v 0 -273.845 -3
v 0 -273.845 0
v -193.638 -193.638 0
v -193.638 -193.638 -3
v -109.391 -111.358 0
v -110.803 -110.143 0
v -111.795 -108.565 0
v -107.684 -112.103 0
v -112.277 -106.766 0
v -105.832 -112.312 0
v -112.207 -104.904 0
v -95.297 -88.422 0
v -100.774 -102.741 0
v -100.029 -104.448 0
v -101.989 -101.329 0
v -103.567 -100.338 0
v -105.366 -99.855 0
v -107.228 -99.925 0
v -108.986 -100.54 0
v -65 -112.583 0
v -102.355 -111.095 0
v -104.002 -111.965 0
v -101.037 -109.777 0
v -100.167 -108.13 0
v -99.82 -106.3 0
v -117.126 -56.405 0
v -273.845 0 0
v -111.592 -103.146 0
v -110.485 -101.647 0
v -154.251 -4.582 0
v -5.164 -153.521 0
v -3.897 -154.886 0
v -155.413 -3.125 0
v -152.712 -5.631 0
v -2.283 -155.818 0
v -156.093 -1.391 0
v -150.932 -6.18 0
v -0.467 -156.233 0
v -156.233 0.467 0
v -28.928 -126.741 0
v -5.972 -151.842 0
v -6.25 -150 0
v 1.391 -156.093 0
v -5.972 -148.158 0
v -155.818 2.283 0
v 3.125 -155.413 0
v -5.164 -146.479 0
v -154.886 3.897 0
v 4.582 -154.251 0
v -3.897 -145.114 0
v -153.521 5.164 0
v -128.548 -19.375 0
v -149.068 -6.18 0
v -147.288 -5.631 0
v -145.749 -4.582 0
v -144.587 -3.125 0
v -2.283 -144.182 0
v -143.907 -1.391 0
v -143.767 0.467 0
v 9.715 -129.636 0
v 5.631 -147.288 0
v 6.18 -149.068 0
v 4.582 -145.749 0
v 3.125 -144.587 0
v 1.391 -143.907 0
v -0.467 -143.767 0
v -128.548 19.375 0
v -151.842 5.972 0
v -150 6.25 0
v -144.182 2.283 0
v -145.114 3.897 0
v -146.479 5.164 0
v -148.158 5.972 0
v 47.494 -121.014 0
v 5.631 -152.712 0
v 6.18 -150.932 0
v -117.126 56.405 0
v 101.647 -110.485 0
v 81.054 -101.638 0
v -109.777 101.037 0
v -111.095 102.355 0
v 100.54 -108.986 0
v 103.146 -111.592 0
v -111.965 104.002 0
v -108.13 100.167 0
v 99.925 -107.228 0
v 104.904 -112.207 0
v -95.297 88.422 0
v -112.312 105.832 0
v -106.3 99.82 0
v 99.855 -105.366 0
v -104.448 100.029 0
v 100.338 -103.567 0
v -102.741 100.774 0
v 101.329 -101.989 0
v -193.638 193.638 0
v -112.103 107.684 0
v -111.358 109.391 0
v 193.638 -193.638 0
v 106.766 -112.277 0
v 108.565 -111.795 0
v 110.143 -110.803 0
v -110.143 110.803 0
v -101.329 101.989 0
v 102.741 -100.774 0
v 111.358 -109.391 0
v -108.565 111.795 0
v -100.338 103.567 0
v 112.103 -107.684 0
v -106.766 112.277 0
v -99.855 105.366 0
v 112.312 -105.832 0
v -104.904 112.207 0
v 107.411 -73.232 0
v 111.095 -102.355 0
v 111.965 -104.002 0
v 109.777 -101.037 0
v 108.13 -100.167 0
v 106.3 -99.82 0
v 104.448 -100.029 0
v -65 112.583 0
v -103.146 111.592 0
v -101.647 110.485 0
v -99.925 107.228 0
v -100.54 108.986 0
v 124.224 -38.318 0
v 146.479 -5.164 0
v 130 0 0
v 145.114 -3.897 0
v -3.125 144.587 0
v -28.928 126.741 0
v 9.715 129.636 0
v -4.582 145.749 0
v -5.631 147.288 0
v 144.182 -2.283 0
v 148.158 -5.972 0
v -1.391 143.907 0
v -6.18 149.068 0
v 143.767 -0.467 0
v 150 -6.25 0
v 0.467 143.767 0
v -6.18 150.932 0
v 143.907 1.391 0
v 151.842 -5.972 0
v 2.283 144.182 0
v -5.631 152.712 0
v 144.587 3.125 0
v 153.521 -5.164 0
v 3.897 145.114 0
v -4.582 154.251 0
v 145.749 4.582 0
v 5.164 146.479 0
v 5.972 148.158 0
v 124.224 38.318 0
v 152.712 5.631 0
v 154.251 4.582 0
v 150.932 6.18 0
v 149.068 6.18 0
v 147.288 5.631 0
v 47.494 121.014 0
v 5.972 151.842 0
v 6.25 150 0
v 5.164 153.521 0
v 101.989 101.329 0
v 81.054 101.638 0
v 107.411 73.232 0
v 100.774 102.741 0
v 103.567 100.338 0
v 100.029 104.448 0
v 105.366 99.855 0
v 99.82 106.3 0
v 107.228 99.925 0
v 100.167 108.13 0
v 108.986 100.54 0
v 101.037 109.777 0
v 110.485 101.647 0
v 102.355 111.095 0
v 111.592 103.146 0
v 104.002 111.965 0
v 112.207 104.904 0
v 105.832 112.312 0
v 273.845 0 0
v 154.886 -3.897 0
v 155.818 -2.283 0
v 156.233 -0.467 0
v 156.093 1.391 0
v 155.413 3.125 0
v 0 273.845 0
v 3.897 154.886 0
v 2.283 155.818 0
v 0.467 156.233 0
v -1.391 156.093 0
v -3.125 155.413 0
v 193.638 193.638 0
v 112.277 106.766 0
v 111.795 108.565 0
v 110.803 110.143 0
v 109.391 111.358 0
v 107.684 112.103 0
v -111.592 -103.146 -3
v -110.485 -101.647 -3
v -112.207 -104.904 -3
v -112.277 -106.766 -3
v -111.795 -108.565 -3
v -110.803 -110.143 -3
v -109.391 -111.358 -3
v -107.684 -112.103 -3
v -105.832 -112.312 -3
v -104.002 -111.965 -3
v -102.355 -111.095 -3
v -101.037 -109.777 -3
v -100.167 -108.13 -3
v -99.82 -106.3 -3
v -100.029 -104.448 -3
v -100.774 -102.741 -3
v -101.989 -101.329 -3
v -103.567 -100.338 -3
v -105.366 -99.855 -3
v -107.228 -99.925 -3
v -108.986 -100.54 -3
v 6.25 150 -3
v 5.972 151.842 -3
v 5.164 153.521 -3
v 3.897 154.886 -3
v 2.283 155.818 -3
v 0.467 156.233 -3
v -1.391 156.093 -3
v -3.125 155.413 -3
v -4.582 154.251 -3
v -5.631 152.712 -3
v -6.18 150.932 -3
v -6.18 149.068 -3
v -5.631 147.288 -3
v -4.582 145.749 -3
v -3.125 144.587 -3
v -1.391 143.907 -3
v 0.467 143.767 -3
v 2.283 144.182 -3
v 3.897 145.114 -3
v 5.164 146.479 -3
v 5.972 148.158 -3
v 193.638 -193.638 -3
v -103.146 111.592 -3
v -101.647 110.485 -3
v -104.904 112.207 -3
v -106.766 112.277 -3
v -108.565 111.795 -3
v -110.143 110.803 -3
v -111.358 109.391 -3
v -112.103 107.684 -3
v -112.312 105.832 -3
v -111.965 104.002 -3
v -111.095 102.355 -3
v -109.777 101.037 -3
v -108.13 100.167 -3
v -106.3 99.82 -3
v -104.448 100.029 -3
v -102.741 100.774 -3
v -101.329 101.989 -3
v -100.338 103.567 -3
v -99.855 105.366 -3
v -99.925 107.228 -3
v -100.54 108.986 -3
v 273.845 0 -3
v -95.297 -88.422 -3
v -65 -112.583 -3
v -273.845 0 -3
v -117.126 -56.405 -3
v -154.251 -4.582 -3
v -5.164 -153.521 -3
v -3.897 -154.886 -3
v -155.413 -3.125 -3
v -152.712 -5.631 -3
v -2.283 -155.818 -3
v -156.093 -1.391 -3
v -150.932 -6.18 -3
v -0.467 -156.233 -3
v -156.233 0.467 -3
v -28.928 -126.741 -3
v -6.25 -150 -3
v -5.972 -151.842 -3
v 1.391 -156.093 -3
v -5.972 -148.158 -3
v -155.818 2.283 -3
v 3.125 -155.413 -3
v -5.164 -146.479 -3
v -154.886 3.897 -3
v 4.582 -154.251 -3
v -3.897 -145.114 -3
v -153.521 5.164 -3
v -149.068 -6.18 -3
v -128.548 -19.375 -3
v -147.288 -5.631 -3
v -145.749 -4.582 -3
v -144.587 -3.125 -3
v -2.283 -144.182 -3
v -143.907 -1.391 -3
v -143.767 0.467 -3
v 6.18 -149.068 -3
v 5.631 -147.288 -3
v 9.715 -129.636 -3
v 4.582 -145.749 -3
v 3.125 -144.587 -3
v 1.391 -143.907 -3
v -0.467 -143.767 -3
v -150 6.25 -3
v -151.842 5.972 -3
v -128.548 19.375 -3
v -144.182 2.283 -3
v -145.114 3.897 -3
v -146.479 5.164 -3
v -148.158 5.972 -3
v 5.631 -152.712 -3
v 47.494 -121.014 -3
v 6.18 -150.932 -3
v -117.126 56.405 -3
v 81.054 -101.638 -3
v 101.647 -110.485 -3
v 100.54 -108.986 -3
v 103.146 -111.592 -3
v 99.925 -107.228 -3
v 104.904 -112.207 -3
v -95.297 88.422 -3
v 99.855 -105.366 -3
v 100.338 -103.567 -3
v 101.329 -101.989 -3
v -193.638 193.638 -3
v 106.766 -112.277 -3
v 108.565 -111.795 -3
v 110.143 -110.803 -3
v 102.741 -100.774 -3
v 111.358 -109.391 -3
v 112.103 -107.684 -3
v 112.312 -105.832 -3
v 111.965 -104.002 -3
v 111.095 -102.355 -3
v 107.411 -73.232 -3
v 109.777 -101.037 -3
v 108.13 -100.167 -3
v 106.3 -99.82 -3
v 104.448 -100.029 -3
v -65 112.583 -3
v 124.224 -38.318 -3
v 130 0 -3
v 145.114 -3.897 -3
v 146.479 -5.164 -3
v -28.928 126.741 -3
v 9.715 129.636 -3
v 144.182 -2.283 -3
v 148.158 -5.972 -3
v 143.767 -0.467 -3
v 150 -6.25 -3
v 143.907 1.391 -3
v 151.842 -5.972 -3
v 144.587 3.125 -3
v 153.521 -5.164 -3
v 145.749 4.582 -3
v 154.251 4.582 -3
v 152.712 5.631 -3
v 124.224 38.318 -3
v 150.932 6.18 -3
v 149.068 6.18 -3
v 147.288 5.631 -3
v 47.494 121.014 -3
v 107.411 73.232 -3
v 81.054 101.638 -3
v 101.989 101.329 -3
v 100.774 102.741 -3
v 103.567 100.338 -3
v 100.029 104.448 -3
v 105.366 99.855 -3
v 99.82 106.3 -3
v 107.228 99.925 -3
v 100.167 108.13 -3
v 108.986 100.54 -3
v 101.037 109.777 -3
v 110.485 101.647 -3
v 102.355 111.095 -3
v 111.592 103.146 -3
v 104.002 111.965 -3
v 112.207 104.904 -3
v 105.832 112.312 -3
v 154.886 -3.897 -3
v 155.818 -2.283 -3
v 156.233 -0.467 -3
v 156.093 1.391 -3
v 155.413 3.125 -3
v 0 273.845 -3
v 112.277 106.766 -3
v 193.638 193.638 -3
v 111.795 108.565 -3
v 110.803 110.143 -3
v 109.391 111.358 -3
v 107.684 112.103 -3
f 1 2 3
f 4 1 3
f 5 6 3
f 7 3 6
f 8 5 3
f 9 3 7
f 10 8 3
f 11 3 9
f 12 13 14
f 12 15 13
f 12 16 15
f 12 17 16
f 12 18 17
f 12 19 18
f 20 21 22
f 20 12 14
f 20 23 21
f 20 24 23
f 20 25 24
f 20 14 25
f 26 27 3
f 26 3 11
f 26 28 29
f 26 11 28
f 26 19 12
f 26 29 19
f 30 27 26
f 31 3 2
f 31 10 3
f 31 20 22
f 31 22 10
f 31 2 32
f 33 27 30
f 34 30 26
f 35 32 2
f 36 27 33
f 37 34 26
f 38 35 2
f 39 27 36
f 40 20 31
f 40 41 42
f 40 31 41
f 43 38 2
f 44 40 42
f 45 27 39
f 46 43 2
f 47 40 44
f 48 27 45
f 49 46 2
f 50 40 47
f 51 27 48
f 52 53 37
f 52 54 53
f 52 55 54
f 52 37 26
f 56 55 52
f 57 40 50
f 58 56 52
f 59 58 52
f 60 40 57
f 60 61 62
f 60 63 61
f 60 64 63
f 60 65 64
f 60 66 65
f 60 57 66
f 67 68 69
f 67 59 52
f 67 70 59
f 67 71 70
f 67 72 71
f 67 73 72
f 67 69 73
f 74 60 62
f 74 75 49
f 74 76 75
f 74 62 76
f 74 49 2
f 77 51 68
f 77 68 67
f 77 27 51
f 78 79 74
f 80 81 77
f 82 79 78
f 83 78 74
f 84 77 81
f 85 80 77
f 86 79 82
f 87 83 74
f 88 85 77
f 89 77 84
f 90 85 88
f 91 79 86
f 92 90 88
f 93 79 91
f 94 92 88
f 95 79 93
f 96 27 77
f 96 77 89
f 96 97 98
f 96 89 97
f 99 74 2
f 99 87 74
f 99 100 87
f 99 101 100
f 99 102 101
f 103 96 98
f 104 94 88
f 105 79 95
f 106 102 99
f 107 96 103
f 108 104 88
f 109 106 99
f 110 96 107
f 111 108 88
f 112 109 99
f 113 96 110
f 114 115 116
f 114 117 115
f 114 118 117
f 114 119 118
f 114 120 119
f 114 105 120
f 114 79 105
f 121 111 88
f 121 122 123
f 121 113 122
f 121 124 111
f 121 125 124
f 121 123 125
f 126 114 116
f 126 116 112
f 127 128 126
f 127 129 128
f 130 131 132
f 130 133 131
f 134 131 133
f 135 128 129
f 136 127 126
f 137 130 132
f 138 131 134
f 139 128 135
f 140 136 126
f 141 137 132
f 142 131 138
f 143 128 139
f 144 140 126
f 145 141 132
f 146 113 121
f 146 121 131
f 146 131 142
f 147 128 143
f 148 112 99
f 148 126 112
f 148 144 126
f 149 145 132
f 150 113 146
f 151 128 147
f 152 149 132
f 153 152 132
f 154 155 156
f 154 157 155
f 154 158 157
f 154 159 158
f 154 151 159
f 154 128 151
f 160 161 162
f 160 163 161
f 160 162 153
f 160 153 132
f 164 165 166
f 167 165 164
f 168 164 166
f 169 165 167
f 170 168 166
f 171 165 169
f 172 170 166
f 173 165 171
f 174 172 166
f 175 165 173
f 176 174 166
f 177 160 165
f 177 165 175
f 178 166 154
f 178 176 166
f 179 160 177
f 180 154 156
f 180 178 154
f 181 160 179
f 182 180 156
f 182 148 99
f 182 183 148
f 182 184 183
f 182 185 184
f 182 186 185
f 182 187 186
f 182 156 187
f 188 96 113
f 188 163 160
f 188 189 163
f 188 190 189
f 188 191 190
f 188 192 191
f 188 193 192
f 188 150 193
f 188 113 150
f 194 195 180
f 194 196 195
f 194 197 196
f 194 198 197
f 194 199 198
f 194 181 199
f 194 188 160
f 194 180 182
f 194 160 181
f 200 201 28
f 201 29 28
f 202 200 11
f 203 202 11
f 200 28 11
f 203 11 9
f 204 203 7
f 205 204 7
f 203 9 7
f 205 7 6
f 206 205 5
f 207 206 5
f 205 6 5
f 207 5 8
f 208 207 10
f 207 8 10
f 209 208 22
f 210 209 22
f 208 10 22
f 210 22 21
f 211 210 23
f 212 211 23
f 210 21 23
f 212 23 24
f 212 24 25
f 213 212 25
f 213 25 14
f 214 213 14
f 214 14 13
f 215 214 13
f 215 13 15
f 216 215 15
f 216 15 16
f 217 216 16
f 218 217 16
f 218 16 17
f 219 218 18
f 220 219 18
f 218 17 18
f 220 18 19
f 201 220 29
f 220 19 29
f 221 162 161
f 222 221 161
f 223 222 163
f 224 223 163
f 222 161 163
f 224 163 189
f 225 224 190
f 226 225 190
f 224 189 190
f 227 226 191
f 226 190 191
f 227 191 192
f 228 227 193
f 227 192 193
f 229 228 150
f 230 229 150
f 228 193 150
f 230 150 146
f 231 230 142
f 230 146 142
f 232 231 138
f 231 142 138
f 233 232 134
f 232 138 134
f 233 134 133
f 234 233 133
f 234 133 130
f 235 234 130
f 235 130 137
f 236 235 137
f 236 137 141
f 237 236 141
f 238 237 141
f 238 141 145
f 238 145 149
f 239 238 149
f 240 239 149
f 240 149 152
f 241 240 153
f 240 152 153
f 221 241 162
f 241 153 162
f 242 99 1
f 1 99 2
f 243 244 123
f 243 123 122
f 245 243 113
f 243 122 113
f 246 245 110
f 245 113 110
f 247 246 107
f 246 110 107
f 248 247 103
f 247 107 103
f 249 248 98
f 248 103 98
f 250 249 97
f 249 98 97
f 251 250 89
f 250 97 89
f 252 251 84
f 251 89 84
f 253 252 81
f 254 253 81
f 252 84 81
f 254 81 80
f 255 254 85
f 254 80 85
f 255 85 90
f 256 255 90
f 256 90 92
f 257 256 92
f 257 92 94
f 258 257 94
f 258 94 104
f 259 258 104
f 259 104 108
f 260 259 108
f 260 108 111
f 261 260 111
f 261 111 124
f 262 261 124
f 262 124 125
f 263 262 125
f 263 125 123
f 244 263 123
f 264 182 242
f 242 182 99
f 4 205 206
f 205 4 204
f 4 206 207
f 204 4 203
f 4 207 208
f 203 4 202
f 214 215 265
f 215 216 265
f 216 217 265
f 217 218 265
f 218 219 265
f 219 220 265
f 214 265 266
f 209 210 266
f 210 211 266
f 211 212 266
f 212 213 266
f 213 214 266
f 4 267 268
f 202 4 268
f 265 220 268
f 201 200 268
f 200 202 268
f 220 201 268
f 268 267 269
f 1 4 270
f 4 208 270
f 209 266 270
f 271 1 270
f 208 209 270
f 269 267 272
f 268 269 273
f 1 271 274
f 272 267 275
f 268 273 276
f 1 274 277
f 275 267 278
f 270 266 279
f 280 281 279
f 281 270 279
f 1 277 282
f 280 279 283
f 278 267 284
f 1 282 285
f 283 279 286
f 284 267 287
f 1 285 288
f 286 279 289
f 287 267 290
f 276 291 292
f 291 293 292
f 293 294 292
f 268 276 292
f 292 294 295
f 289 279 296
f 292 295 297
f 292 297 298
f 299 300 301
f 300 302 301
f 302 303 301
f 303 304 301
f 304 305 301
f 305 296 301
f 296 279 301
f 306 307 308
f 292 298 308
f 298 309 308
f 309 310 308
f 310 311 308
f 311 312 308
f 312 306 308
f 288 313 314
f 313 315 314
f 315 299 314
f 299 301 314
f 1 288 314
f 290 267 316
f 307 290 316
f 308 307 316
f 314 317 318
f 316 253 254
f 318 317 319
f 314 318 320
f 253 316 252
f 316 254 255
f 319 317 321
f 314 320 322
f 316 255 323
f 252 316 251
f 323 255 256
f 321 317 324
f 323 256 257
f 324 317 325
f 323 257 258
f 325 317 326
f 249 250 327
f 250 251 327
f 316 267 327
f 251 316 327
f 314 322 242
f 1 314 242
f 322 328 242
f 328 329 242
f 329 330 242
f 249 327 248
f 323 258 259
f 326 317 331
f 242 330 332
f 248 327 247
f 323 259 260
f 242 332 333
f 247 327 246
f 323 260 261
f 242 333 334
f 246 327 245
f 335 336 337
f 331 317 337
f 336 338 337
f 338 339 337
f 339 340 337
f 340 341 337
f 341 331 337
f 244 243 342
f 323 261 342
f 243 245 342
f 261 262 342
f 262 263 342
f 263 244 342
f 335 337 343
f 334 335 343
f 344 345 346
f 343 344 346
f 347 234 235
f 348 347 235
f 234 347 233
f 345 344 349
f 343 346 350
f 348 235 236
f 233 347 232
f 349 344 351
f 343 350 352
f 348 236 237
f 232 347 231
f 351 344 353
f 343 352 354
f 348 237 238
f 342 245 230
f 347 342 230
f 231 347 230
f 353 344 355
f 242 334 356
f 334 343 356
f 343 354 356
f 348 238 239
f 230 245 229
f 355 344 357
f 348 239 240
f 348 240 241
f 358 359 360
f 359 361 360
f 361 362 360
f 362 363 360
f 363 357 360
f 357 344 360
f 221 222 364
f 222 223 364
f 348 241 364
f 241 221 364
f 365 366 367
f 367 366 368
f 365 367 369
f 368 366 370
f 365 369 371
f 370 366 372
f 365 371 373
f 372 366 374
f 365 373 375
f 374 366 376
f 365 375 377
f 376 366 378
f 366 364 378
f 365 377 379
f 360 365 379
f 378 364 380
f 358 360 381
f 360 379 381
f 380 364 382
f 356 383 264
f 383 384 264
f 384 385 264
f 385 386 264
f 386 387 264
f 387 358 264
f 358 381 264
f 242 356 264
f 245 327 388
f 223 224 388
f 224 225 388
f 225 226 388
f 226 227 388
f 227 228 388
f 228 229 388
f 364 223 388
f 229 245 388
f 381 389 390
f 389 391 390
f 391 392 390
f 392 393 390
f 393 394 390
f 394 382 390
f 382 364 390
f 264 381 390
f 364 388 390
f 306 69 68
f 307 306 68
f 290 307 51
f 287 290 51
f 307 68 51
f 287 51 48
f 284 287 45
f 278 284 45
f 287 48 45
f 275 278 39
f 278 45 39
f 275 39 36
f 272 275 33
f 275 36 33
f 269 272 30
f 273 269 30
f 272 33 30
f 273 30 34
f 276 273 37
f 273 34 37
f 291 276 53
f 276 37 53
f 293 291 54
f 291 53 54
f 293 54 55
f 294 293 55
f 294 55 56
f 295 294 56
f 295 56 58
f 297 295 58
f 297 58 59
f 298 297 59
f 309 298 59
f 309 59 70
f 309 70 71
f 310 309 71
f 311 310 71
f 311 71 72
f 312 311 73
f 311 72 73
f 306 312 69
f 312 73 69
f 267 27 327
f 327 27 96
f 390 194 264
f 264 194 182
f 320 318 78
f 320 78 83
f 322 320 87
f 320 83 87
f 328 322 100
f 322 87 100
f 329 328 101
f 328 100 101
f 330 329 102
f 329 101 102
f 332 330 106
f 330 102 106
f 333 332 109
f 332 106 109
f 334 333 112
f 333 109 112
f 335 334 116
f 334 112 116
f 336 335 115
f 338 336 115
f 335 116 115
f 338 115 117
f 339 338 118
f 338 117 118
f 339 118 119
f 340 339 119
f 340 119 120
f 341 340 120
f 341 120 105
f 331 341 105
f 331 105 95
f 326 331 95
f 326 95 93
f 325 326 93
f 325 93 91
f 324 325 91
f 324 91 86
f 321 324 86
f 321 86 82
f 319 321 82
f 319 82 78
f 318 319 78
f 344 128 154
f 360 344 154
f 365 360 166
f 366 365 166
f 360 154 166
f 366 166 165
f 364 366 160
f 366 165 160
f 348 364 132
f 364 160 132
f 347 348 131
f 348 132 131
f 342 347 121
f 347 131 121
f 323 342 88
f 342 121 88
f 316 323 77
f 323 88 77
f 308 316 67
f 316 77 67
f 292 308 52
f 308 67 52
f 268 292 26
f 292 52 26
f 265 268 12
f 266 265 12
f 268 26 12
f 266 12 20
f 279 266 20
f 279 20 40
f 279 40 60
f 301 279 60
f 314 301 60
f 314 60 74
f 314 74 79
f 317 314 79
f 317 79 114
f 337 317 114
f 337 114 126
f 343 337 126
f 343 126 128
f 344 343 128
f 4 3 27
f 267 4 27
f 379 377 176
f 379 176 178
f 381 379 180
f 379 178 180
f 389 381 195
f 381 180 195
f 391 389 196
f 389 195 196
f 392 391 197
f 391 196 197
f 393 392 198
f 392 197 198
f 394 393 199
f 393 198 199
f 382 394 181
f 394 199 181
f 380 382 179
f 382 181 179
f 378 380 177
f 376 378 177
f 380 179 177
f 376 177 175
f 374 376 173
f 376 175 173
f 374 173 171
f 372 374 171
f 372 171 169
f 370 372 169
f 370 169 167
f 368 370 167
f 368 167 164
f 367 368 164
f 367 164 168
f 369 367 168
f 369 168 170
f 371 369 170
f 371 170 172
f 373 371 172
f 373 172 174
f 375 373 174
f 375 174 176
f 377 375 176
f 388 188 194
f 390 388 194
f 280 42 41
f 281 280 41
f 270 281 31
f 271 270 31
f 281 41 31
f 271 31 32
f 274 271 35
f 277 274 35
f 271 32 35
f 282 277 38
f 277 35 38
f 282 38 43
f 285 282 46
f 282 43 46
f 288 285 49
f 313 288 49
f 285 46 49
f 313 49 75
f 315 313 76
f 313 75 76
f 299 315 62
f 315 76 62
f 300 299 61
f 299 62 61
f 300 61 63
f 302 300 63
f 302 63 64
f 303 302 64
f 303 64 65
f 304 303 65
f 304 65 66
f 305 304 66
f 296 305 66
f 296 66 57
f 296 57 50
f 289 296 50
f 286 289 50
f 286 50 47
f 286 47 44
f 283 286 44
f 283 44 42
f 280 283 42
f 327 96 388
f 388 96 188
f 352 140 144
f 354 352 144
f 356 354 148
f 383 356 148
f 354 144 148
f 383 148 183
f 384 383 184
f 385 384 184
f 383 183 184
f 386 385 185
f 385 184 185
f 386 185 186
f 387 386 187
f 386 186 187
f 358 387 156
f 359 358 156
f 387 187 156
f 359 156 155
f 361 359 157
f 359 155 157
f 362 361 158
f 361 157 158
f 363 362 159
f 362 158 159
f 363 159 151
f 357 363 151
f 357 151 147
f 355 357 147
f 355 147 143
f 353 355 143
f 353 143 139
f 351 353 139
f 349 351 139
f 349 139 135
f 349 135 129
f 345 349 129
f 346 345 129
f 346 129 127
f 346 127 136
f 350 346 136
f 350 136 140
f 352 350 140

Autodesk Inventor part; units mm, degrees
ref_plane "YZ Plane" through (0, 0, 0) normal (1, 0, 0) x (0, 1, 0)
ref_plane "XZ Plane" through (0, 0, 0) normal (0, 1, 0) x (-1, 0, 0)
ref_plane "XY Plane" through (0, 0, 0) normal (0, 0, 1) x (1, 0, 0)
sketch "Sketch2" plane through (0, 0, 0) normal (0, 0, 1) x (1, 0, 0)
  line L0 (-193.6378, 193.6378) -> (0, 273.8452)
  line L1 (0, 273.8452) -> (193.6378, 193.6378)
  line L2 (193.6378, 193.6378) -> (273.8452, 0)
  line L3 (273.8452, 0) -> (193.6378, -193.6378)
  line L4 (193.6378, -193.6378) -> (0, -273.8452)
  line L5 (0, -273.8452) -> (-193.6378, -193.6378)
  line L6 (-193.6378, -193.6378) -> (-273.8452, 0)
  line L7 (-273.8452, 0) -> (-193.6378, 193.6378)
  circle A0 centre (0, 0) radius 130
  dimension "d23" = 506
  dimension "d26" = 260
extrude "Plate1" add sketch "Sketch2" against normal blind 3
sketch "Sketch4" plane through (0, 0, 0) normal (0, 0, 1) x (1, 0, 0)
  circle A0 centre (0, 150) radius 6.25
  circle A1 centre (0, 0) radius 130 projected
  dimension "d16" = 12.5
  dimension "d17" = 150
extrude "Extrusion1" cut sketch "Sketch4" against normal up to surface (3 mm away) contours A0
pattern_circular "Circular Pattern1" count 8 over 360 about axis through (0, 0, -10) along (0, 0, 1) of "Extrusion1"
equation "\"d23\" = Барабан_габарит_по_кассетам"
equation "\"d26\" = Вал_ось_диаметр_НОС"
equation "\"d15\" = Thickness"
equation "\"BendRadius\" = Thickness"
equation "\"BendReliefWidth\" = Thickness"
equation "\"BendReliefDepth\" = 0.5 * Thickness"
equation "\"CornerReliefSize\" = 4 * Thickness"
equation "\"MinimumRemnant\" = 2 * Thickness"
equation "\"TransitionRadius\" = BendRadius"
equation "\"JacobiRadiusSize\" = BendRadius"
equation "\"GapSize\" = Thickness"
equation "\"Барабан_габарит_по_кассетам\" = 506"
equation "\"Вал_ось_диаметр_НОС\" = 260"
equation "\"Thickness\" = 3"
properties part number "ДМС 101 Барабан торец"
